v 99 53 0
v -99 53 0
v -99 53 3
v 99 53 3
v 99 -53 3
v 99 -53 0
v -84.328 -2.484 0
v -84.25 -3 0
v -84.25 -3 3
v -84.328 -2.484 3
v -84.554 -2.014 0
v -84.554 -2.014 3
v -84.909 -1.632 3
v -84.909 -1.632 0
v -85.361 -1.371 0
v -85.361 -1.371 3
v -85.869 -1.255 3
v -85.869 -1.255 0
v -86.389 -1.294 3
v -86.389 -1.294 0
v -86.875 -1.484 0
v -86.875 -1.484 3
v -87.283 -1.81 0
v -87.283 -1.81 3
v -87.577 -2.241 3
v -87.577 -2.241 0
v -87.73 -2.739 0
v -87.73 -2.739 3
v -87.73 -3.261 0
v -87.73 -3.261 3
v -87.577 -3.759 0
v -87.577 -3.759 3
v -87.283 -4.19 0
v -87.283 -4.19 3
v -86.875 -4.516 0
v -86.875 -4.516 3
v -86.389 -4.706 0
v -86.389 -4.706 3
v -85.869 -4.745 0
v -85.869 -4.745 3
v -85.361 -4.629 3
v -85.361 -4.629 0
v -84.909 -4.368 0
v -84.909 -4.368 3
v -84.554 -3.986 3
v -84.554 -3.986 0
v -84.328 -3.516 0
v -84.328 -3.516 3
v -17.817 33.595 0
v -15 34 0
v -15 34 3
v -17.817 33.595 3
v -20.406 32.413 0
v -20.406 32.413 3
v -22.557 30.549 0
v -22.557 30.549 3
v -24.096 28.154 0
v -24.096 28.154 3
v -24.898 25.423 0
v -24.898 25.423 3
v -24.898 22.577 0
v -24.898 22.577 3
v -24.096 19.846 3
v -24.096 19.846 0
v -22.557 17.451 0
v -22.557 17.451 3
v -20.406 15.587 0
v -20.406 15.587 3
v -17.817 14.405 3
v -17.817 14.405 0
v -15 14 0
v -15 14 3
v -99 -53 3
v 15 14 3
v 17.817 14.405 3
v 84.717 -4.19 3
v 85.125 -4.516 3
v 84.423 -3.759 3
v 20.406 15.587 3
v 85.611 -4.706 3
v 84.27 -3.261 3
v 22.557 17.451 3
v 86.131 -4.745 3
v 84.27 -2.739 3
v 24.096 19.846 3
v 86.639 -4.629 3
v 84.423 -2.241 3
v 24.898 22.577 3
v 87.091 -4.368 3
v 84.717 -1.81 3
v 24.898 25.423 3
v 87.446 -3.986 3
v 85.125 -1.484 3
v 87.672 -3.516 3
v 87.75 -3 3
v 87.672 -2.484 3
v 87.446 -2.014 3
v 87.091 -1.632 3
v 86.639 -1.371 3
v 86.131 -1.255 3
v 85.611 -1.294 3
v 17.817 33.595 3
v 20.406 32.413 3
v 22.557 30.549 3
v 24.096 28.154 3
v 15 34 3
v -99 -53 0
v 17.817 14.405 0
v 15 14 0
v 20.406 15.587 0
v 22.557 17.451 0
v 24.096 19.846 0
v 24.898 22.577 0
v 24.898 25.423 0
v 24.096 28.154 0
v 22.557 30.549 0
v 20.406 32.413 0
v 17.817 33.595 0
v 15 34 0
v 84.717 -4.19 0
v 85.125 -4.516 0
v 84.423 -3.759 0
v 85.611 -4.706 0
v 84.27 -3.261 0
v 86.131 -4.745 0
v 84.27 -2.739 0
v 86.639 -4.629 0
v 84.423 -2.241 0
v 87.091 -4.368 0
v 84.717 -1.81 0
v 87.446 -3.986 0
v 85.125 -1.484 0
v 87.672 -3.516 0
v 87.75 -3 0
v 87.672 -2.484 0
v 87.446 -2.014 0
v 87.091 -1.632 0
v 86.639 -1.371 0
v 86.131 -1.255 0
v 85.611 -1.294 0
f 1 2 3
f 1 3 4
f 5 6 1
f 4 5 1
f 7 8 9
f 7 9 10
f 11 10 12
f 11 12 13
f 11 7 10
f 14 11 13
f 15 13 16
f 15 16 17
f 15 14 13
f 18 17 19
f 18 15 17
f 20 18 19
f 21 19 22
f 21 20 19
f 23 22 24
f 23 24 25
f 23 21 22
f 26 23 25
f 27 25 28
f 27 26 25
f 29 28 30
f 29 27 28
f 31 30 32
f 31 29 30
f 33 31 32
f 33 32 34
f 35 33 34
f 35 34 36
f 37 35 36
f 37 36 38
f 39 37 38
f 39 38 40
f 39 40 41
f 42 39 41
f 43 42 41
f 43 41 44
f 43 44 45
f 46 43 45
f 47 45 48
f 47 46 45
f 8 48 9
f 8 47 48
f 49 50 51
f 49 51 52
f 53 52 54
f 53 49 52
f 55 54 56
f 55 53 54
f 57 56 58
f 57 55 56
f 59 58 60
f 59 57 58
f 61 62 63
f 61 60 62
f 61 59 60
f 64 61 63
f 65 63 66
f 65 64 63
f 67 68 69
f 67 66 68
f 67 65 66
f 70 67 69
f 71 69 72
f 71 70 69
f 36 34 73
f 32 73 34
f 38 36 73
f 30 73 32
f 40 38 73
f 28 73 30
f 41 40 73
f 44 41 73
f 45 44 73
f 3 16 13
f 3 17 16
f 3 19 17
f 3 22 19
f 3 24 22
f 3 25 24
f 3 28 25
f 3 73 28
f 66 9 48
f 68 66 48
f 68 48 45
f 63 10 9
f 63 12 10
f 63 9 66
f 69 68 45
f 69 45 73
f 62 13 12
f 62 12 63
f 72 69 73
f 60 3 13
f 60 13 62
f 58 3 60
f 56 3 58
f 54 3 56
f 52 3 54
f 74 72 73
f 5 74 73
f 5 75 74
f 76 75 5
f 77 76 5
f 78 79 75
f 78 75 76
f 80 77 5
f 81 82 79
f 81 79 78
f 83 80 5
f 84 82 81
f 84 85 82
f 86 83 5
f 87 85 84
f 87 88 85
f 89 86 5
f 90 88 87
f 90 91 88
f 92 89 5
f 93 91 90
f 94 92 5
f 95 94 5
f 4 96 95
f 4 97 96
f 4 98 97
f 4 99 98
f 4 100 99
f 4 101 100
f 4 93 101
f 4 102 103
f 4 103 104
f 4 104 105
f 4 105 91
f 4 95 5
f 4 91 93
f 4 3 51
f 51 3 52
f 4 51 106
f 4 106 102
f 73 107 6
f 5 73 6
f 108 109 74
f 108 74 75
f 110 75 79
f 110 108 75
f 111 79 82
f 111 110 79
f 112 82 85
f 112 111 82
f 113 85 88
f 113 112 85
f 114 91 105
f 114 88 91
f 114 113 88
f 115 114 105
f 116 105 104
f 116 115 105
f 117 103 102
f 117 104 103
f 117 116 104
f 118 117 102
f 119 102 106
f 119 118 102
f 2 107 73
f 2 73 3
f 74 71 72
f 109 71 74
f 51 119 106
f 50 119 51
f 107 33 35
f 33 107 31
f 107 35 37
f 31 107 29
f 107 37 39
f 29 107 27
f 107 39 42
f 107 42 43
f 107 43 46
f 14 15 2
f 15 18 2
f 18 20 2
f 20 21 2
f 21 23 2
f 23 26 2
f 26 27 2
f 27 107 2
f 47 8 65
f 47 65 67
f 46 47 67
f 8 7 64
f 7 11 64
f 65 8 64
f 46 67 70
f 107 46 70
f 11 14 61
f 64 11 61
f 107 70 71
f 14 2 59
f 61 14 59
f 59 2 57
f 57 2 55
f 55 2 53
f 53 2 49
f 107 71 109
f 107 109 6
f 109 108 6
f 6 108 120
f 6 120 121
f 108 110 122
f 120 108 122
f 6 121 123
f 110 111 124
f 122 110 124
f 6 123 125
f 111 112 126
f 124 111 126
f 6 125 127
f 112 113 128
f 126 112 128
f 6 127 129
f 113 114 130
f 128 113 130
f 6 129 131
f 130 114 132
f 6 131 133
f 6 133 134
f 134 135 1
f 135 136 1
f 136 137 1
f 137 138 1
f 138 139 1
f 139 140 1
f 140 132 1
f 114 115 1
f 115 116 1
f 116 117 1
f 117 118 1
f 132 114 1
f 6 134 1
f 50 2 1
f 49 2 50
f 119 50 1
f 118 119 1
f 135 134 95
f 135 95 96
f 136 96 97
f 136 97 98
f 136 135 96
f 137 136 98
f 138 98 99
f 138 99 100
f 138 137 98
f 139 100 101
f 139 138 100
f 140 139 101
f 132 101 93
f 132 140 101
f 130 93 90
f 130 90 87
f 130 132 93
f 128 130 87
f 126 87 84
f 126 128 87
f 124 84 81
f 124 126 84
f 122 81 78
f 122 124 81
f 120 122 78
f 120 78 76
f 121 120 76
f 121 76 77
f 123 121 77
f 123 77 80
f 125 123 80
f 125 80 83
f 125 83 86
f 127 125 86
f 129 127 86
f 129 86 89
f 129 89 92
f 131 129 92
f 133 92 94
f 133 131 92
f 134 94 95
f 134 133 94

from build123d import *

# Parameters (mm, degrees)
ESQUISSE1_W             = 198
ESQUISSE1_H             = 106
ESQUISSE1_R             = 1.75
BOSS_EXTRU_1_DEPTH      = 3
ENL_V_MAT_EXTRU_1_DEPTH = 4


with BuildPart() as part:
    # Esquisse1 → Boss.-Extru.1 (new body)
    with BuildSketch(Plane.XY):
        Rectangle(ESQUISSE1_W, ESQUISSE1_H)
        with Locations((-86, -3)):
            Circle(ESQUISSE1_R, mode=Mode.SUBTRACT)
        with Locations((86, -3)):
            Circle(ESQUISSE1_R, mode=Mode.SUBTRACT)
    extrude(amount=BOSS_EXTRU_1_DEPTH)

    # Esquisse2 → Enlèv. mat.-Extru.1 (cut, through all)
    with BuildSketch(Plane(origin=(0, 0, 0), x_dir=(-1, 0, 0), z_dir=(0, 0, -1))):
        with BuildLine():
            Line((-15, 34), (15, 34))
            ThreePointArc((15, 34), (25, 24), (15, 14))
            Line((15, 14), (-15, 14))
            ThreePointArc((-15, 14), (-25, 24), (-15, 34))
        make_face()
    extrude(amount=-ENL_V_MAT_EXTRU_1_DEPTH, mode=Mode.SUBTRACT)


solid = part.part
